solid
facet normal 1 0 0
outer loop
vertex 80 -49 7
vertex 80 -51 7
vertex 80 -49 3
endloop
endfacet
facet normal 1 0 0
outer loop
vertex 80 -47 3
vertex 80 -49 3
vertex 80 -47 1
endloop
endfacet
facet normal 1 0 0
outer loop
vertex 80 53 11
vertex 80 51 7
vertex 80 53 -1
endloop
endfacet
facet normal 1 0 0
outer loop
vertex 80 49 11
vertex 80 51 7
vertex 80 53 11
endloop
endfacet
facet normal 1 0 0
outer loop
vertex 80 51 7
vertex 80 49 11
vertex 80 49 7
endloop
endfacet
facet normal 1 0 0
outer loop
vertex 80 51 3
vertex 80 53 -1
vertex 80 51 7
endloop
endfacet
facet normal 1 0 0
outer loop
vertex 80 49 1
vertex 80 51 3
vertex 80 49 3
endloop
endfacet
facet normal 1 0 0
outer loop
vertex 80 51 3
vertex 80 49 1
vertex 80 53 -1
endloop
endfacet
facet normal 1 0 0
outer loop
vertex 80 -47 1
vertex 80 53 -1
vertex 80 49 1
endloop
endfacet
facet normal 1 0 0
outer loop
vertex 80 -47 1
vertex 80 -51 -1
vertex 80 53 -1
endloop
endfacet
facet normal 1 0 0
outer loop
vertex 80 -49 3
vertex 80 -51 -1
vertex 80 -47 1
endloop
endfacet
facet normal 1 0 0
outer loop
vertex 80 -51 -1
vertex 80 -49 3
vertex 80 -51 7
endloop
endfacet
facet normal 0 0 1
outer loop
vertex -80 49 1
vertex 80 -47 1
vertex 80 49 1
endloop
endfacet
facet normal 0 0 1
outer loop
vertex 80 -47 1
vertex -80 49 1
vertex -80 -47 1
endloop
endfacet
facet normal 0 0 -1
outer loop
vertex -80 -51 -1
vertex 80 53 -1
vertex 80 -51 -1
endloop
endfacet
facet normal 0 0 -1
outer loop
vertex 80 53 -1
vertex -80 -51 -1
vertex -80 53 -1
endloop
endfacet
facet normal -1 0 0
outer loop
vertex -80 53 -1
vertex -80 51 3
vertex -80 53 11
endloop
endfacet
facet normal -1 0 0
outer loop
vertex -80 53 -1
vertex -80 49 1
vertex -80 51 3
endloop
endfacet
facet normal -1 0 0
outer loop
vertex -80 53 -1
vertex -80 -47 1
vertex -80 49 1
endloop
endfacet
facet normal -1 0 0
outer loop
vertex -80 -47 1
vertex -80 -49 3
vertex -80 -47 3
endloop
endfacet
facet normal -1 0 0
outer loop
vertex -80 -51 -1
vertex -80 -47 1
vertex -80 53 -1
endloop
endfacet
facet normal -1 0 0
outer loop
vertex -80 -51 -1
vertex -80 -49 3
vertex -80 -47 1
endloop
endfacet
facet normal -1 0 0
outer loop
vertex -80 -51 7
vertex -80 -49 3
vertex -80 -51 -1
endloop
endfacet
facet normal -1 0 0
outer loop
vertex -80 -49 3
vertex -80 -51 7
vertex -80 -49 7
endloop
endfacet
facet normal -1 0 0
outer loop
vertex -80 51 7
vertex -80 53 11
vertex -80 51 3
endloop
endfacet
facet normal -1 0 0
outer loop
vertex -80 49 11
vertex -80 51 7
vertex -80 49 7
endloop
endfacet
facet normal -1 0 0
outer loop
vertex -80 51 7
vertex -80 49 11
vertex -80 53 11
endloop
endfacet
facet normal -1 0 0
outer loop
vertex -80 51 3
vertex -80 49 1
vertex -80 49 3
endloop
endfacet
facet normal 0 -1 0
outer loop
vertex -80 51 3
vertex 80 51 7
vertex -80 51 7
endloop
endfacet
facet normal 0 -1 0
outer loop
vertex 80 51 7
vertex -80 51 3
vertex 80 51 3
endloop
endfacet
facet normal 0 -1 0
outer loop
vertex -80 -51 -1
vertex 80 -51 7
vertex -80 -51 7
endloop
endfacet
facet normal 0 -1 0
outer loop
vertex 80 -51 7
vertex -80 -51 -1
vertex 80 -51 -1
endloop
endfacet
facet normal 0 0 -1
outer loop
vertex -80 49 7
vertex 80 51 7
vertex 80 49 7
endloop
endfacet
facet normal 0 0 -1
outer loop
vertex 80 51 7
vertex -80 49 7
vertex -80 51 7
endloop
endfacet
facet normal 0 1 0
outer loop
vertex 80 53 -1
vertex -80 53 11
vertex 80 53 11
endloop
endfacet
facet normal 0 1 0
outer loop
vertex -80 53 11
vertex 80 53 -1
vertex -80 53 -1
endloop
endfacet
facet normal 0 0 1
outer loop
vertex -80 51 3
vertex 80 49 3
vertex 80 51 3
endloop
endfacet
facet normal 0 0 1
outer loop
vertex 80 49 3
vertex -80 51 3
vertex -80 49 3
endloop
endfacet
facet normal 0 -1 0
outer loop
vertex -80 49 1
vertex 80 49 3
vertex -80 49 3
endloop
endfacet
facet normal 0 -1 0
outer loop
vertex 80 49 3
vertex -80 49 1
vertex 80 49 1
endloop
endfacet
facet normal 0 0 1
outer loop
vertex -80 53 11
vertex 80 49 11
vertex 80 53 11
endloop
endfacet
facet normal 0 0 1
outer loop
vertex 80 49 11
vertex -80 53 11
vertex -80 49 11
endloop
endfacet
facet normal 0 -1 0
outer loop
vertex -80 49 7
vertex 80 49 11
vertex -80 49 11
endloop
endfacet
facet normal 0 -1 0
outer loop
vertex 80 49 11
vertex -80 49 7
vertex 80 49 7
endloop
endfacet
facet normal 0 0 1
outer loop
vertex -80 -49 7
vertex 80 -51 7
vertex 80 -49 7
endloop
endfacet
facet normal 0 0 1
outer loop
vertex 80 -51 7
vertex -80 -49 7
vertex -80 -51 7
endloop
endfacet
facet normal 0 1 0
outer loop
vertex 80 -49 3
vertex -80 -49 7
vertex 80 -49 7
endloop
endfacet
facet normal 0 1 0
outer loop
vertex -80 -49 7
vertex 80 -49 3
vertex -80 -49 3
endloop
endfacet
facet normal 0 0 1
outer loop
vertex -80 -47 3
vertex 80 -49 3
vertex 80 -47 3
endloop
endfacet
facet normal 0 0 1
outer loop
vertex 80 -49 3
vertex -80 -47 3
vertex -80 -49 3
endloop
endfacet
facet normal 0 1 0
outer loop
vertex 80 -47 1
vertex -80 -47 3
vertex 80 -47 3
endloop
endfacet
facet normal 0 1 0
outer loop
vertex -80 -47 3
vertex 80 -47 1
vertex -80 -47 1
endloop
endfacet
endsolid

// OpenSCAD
width=160;
height=102;
thick=2;
border=8;
spacer=4;
spacerWidth=2;
cube([width,height,thick], center=true);
// Left side
translate([(-width/2), (height/2), (-thick/2)]) {
    cube([width, 2, border]);
}
translate([(-width/2), (height/2)-spacerWidth, (-thick/2)]) {
    cube([width, spacerWidth, spacer]);
}
translate([(-width/2), (height/2)-spacerWidth, border-(thick/2)]) {
    cube([width, spacerWidth*2, spacer]);
}

// Right side
translate([(-width/2), (-height/2), (-thick/2)]) {
    cube([width, 2, border]);
}
translate([(-width/2), (-height/2)+spacerWidth, (-thick/2)]) {
    cube([width, spacerWidth, spacer]);
}
